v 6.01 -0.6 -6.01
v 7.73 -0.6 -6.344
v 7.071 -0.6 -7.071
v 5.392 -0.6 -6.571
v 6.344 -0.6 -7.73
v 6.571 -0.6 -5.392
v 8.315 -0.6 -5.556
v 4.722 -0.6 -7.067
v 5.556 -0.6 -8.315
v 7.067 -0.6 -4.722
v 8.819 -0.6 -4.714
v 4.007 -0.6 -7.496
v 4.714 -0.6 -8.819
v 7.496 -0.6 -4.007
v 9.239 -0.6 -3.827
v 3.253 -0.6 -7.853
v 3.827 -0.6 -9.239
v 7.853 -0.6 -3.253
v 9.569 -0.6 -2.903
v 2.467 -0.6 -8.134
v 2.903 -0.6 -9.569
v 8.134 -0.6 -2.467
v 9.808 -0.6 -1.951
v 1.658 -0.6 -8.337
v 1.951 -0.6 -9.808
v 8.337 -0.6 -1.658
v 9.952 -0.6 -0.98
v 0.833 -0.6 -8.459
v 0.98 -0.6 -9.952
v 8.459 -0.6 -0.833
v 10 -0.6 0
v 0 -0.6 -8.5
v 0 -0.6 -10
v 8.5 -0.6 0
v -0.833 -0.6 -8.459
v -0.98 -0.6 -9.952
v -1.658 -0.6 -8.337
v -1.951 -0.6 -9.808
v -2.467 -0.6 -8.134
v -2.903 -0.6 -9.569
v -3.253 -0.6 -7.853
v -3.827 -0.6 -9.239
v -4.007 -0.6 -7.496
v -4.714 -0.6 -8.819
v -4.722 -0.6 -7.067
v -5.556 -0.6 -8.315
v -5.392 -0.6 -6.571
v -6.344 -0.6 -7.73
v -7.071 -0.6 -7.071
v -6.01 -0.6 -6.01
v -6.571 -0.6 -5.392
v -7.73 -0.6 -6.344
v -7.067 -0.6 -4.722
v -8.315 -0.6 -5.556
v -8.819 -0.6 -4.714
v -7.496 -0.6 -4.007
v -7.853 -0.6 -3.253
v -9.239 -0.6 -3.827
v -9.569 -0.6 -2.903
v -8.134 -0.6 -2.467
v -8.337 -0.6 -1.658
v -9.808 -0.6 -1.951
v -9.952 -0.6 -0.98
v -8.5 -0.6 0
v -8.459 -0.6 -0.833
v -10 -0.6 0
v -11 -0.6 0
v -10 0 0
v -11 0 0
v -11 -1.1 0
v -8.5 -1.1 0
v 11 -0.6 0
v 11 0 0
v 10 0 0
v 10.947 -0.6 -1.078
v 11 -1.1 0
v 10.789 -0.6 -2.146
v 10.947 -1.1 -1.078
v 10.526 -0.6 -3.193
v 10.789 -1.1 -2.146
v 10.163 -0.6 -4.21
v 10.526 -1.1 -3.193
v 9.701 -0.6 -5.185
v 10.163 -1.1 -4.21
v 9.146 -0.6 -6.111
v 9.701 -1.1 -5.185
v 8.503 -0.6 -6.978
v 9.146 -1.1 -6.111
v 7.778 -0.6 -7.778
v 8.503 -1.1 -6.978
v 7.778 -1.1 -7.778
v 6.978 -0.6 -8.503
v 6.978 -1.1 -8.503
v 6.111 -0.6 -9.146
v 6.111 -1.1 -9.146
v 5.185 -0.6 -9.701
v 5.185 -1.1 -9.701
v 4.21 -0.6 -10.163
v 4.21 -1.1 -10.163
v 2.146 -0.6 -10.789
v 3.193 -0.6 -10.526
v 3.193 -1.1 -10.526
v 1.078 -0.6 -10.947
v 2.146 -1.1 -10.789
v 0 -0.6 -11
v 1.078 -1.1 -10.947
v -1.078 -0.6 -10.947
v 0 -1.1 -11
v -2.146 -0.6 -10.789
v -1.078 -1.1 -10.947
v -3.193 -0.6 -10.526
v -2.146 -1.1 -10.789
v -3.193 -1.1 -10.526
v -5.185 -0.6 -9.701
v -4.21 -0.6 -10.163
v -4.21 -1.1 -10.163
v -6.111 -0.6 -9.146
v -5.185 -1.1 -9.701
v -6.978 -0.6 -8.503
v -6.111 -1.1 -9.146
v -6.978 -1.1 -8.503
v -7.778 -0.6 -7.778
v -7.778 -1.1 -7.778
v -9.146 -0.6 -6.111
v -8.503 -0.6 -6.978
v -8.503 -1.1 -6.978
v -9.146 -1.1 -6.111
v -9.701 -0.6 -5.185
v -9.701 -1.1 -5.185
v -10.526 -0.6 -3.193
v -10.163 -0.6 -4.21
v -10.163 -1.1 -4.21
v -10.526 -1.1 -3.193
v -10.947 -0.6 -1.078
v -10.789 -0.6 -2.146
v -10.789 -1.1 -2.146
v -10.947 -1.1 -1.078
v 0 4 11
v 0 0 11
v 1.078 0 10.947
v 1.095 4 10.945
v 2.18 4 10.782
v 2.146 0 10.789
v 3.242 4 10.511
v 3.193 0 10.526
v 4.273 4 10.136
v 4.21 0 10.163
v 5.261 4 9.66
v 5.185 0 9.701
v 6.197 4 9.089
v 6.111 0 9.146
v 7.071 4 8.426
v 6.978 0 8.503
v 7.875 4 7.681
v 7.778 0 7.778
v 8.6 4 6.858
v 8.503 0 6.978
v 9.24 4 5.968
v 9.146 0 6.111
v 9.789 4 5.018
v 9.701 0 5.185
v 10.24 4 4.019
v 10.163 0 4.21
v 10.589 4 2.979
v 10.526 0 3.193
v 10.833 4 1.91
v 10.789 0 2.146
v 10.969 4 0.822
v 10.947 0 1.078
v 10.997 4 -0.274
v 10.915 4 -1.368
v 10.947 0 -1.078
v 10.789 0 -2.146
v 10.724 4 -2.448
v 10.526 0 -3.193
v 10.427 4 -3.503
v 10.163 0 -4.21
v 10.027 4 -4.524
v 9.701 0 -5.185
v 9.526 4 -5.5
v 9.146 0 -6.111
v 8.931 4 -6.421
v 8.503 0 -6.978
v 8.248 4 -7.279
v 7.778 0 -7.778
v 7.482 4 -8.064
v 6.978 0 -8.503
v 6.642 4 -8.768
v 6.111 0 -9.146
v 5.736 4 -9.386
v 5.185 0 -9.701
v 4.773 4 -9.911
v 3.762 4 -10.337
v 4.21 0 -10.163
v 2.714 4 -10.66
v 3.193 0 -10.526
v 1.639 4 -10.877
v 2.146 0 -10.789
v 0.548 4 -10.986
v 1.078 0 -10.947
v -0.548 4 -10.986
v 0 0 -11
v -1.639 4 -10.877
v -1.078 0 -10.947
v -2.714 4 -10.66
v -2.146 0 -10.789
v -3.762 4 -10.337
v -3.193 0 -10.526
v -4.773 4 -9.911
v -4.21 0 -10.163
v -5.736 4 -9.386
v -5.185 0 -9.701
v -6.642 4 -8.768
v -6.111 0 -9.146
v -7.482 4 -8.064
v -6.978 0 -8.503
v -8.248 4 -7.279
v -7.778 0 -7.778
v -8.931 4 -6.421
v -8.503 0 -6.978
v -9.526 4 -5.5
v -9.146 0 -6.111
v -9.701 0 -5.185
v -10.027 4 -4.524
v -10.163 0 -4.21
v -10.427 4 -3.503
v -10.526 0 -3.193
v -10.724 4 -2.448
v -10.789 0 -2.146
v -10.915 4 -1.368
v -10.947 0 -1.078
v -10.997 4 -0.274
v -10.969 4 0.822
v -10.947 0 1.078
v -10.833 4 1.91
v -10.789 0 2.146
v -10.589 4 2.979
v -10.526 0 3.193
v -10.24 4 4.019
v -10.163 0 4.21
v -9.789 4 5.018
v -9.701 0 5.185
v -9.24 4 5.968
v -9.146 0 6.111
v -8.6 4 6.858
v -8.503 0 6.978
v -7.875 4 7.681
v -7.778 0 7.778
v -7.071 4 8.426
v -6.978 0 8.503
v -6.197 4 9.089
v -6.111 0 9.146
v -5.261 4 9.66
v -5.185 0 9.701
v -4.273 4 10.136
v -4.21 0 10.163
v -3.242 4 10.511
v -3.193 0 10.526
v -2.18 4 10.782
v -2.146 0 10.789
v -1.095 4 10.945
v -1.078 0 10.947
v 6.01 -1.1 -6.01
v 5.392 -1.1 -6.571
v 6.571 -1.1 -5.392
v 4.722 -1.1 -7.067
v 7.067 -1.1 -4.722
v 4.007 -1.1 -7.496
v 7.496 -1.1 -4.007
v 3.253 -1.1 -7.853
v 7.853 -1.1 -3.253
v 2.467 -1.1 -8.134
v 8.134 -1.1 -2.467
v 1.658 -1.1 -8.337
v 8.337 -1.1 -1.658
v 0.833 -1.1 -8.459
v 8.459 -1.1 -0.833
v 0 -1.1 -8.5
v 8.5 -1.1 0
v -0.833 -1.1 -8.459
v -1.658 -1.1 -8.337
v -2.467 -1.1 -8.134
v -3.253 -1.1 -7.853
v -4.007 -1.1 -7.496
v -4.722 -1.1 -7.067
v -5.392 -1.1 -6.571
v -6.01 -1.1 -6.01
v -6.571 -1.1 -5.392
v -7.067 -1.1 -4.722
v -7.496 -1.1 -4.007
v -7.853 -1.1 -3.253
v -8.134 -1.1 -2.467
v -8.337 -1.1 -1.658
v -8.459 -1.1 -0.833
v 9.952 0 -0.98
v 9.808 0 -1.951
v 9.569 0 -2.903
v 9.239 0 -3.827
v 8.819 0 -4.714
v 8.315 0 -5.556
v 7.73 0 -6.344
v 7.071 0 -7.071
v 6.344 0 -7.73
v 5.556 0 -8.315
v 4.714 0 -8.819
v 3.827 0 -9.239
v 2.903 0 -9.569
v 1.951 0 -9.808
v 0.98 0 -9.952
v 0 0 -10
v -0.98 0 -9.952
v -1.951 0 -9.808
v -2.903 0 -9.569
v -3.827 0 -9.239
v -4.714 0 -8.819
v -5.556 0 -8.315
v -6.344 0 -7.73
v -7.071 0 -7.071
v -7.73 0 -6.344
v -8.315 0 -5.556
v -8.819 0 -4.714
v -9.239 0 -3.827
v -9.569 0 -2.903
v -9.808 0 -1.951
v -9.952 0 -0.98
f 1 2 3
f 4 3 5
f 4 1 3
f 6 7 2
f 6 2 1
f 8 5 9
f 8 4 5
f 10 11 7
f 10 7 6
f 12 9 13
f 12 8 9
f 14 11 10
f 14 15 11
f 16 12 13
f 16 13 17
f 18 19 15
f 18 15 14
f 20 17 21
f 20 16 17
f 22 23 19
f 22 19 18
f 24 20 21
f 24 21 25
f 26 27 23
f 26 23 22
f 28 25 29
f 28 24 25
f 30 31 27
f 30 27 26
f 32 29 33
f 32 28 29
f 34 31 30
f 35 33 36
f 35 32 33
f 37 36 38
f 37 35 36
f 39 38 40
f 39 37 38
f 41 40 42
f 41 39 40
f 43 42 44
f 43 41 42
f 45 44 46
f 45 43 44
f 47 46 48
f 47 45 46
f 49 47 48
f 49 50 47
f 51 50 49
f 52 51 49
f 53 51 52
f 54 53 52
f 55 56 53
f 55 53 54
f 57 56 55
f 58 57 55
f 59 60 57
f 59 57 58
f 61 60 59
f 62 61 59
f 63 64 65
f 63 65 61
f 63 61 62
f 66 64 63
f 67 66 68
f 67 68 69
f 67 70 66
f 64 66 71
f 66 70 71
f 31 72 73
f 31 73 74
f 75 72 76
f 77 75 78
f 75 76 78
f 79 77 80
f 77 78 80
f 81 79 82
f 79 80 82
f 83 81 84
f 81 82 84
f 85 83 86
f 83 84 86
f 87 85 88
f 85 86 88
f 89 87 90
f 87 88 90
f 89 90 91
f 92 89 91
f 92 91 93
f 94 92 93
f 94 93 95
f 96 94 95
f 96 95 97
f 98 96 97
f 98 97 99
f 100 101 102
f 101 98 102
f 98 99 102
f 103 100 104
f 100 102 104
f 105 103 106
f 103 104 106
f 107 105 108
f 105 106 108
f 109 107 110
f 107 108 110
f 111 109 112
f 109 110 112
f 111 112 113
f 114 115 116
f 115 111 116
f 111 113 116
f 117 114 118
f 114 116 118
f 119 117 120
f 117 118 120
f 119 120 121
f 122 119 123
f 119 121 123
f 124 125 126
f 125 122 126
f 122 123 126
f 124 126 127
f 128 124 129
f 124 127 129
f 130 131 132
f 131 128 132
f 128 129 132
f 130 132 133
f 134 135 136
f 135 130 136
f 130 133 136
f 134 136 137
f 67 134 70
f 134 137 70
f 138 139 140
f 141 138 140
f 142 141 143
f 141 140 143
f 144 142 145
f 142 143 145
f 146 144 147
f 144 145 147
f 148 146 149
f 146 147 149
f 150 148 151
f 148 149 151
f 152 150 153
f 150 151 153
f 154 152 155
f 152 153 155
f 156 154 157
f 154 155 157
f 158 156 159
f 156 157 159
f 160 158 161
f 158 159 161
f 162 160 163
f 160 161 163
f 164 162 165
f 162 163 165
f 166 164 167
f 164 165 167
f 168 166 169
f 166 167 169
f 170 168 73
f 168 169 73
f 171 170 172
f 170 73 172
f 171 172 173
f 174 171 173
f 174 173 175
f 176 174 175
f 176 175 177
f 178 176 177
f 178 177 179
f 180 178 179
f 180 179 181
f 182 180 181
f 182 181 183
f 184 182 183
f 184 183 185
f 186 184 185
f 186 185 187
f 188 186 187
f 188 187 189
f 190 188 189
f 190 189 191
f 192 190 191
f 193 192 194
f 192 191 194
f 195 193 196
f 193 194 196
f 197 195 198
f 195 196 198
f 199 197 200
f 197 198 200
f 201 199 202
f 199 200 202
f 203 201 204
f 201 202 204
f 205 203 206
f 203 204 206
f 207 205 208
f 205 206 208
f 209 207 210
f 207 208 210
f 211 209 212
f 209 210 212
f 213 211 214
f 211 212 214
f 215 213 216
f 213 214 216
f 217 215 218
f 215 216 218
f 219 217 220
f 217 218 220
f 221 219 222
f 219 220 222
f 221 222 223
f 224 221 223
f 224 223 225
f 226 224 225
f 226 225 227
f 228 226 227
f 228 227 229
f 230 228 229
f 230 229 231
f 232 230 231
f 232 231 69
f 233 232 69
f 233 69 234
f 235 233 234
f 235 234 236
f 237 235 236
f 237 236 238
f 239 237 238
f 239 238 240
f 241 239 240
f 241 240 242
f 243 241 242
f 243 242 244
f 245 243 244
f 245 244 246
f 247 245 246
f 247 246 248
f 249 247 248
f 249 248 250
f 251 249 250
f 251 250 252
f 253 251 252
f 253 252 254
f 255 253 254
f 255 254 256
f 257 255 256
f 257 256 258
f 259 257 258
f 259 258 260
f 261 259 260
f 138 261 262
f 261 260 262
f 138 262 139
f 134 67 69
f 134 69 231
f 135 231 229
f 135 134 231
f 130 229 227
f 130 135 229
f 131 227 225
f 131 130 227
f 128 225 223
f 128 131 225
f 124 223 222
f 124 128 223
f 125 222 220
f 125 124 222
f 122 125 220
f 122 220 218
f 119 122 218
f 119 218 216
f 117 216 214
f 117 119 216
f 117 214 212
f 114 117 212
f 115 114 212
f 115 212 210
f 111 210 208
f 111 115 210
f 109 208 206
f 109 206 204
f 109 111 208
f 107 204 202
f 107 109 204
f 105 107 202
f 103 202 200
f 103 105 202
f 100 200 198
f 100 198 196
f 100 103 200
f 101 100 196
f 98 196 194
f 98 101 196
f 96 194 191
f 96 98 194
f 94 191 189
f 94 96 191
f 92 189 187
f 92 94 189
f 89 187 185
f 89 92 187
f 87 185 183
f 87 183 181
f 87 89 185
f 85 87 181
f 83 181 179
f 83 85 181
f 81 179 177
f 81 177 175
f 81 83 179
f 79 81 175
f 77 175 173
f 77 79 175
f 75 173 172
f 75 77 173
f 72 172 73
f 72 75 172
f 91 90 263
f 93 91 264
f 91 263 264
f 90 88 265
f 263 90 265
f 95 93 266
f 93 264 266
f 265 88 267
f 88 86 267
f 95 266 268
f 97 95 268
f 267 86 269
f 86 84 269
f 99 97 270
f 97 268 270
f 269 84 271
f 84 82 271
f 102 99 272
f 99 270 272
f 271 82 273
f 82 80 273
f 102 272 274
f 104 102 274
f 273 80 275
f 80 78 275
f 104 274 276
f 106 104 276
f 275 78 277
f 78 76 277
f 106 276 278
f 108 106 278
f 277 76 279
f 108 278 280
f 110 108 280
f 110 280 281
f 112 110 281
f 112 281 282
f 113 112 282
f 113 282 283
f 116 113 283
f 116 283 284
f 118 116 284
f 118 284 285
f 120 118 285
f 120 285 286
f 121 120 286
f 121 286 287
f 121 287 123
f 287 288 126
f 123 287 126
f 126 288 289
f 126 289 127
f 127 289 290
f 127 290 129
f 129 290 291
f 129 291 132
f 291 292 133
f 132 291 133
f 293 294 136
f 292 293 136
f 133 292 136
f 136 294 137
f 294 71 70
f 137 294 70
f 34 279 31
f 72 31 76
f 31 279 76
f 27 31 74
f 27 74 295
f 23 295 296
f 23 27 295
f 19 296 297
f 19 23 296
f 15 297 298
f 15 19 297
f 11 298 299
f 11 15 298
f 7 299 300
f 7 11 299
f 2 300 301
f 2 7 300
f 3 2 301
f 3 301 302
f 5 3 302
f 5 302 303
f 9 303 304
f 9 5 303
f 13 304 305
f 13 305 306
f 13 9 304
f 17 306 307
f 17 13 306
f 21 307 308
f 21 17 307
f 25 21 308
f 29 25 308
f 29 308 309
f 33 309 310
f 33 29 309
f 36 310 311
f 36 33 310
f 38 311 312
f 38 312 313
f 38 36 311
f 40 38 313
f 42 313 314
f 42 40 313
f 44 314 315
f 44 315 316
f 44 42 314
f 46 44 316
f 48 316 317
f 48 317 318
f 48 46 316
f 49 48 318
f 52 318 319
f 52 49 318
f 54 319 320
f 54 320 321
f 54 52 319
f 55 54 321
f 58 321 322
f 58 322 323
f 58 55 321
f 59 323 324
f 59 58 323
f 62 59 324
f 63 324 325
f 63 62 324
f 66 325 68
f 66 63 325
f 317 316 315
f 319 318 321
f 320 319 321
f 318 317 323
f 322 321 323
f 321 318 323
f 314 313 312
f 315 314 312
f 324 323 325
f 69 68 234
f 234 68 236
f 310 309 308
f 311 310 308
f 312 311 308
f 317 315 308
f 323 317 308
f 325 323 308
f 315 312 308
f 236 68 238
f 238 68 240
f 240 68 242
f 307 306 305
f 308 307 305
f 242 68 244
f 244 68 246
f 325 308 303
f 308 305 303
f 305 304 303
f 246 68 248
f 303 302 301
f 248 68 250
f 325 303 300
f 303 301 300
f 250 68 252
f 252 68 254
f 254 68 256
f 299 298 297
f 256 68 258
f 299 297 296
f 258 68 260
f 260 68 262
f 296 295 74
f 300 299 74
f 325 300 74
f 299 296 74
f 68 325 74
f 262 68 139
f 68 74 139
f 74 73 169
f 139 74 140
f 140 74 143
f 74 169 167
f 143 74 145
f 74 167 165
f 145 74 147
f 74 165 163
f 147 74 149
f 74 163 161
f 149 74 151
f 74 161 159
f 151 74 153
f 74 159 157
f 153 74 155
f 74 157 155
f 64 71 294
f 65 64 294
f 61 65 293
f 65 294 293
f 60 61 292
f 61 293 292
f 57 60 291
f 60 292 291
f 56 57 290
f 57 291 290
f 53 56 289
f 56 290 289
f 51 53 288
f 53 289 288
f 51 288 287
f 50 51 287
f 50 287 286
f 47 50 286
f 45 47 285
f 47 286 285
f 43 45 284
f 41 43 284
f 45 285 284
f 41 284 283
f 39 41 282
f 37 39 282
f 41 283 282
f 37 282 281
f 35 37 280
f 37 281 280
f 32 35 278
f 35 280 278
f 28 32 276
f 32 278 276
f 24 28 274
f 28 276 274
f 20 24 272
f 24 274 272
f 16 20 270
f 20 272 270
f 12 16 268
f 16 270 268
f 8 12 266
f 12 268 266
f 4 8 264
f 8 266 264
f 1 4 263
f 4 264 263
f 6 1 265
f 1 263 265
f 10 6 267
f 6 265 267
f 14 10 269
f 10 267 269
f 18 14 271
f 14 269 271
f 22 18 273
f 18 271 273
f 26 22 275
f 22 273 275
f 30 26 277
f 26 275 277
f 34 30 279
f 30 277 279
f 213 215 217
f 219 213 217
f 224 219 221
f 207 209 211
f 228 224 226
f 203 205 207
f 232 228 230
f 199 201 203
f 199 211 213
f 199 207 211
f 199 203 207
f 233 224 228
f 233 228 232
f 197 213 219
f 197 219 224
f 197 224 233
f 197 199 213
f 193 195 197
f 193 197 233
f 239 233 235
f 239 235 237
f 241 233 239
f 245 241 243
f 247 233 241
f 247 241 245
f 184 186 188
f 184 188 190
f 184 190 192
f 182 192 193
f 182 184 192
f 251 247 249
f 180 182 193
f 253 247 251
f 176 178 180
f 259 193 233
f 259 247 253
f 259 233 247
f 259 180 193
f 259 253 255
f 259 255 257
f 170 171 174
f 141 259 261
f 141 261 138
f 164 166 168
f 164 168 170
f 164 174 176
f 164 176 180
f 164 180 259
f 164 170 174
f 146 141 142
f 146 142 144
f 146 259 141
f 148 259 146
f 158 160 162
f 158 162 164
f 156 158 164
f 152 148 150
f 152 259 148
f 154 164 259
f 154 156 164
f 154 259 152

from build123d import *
from build123d.topology import SkipClean

# Parameters (mm, degrees)
SKETCH2_R           = 11
BOSS_EXTRUDE1_DEPTH = 4
BOSS_EXTRUDE2_START = -0.6
BOSS_EXTRUDE2_DEPTH = 0.6
BOSS_EXTRUDE3_START = 0.5
BOSS_EXTRUDE3_DEPTH = 0.5


with BuildPart() as part:
    # Sketch2 → Boss-Extrude1 (new body)
    with BuildSketch(Plane(origin=(0, 0, 0), x_dir=(1, 0, 0), z_dir=(0, 1, 0))):
        Circle(SKETCH2_R)
    extrude(amount=BOSS_EXTRUDE1_DEPTH)

    # Sketch3 → Boss-Extrude2 (add)
    with SkipClean():  # the faces are left unmerged after this step: merging them gives an invalid solid
        with BuildSketch(Plane(origin=(0, 0, 0), x_dir=(1, 0, 0), z_dir=(0, 1, 0)).offset(BOSS_EXTRUDE2_START)):
            with BuildLine():
                Line((-10, 0), (-11, 0))
                ThreePointArc((-11, 0), (0, 11), (11, 0))
                Line((11, 0), (10, 0))
                ThreePointArc((10, 0), (0, 10), (-10, 0))
            make_face()
        extrude(amount=BOSS_EXTRUDE2_DEPTH)

    # Sketch4 → Boss-Extrude3 (add)
    with SkipClean():  # the faces are left unmerged after this step: merging them gives an invalid solid
        with BuildSketch(Plane.XZ.offset(0.6).offset(BOSS_EXTRUDE3_START)):
            with BuildLine():
                Line((-11, 0), (-8.5, 0))
                ThreePointArc((-8.5, 0), (0, -8.5), (8.5, 0))
                Line((8.5, 0), (11, 0))
                ThreePointArc((11, 0), (0, -11), (-11, 0))
            make_face()
        extrude(amount=-BOSS_EXTRUDE3_DEPTH)


solid = part.part
